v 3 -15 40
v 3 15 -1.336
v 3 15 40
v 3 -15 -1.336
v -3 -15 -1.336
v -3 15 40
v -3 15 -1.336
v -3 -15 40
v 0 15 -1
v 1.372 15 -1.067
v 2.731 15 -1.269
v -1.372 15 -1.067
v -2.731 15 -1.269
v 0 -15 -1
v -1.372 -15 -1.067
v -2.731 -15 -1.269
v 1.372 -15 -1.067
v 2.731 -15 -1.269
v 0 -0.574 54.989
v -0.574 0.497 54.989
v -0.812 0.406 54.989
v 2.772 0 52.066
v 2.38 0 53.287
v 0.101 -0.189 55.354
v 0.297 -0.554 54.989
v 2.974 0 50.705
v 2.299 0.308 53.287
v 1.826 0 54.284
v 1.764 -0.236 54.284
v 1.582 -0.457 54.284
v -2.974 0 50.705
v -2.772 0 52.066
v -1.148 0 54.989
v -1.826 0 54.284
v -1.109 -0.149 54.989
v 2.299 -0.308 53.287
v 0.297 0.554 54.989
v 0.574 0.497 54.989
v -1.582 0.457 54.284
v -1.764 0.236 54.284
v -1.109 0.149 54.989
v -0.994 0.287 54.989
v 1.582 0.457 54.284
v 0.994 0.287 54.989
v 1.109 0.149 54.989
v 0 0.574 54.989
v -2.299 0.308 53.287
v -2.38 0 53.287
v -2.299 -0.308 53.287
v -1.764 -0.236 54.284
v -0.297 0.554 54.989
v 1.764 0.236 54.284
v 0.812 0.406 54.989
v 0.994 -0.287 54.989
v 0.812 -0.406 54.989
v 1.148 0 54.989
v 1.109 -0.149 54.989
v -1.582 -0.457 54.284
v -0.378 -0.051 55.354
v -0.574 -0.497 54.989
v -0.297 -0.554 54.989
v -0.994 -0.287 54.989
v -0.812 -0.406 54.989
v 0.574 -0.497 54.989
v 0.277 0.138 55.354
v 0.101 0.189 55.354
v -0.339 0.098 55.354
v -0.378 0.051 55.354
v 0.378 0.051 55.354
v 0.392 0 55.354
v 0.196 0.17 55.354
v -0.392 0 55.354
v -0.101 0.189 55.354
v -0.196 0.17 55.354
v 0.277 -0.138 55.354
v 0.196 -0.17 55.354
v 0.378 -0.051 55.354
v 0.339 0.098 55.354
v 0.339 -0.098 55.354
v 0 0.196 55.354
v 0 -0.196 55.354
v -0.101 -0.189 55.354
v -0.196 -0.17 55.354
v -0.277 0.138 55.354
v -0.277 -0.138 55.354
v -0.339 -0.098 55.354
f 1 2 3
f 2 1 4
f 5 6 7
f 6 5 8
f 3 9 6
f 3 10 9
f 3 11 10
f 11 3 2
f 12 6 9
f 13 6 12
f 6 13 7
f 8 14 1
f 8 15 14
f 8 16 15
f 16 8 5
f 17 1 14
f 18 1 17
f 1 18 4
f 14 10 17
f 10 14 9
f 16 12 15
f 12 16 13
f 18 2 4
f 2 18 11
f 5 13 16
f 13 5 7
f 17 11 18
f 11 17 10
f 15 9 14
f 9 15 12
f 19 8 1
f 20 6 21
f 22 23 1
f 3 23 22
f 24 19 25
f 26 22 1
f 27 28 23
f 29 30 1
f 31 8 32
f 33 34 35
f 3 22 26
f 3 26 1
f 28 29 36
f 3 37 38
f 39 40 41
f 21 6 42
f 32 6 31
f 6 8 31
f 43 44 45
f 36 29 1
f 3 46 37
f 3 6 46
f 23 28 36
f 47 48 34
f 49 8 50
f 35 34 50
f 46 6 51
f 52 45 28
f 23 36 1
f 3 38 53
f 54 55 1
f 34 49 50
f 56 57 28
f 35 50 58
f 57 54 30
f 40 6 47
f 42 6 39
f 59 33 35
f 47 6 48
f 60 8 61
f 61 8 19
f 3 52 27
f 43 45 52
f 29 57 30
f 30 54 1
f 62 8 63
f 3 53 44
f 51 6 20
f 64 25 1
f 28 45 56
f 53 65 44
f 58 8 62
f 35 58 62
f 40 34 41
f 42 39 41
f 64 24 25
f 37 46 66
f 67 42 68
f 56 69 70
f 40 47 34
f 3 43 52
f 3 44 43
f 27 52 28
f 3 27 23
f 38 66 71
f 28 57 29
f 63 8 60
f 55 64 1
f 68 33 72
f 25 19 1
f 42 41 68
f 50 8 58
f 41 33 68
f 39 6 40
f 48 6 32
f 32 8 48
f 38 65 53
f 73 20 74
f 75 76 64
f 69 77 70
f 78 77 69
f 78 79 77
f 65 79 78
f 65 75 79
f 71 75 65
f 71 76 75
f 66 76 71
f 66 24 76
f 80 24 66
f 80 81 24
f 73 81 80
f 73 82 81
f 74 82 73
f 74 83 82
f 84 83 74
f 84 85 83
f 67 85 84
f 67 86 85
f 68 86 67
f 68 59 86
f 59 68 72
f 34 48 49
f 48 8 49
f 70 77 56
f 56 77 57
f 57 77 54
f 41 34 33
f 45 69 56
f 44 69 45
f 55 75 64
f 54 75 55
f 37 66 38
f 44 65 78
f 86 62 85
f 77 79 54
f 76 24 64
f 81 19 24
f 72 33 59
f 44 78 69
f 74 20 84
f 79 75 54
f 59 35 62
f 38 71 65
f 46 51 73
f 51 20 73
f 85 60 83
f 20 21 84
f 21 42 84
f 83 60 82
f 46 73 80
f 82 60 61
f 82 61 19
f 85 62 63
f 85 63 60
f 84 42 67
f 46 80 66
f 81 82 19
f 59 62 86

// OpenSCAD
// file: ../common.scad
/*
 * WAVE OCEAN V10 - TWISTED CAM SYSTEM
 * COMMON PARAMETERS
 *
 * Simplified mechanism: slats rest on cam surface, no follower arms
 * Single helical ridge creates traveling wave as cam rotates
 *
 * All dimensions in mm
 */

// ============================================
// PRINT TOLERANCES (tune for your printer)
// ============================================

TOL_CLEARANCE = 0.2;         // Shaft in hole clearance
TOL_PRESS_FIT = -0.15;       // Bearing press-fit interference
TOL_SLIDING = 0.3;           // Sliding fit (slats in guides)

// ============================================
// HARDWARE - BEARINGS
// ============================================

// 608 bearing (main shaft) - common, cheap
BEARING_608_ID = 8;
BEARING_608_OD = 22;
BEARING_608_H = 7;

// ============================================
// HARDWARE - FASTENERS
// ============================================

M3_HOLE = 3.2;
M3_HEAD_DIA = 5.5;
M3_HEAD_H = 3;
M4_HOLE = 4.2;

// ============================================
// MAIN SHAFT
// ============================================

SHAFT_DIA = 8;                   // 8mm steel rod
SHAFT_LENGTH = 260;              // Total shaft length
SHAFT_HOLE = SHAFT_DIA + TOL_CLEARANCE;  // 8.2mm

// ============================================
// TWISTED CAM DIMENSIONS
// ============================================

CAM_LENGTH = 200;                // Active wave zone
CAM_CORE_RADIUS = 12;            // Base cylinder radius
CAM_RIDGE_HEIGHT = 10;           // How much ridge sticks out
CAM_RIDGE_WIDTH = 8;             // Width of ridge (smoothness)
CAM_MAX_RADIUS = CAM_CORE_RADIUS + CAM_RIDGE_HEIGHT;  // 22mm

// Helix parameters
HELIX_TURNS = 2;                 // Number of complete spirals
HELIX_PITCH = CAM_LENGTH / HELIX_TURNS;  // 100mm per turn

// ============================================
// SLAT DIMENSIONS
// ============================================

NUM_SLATS = 24;
SLAT_SPACING = CAM_LENGTH / NUM_SLATS;  // 8.33mm

SLAT_WIDTH = 6;                  // X dimension (along cam axis)
SLAT_DEPTH = 30;                 // Y dimension (front to back)
SLAT_HEIGHT = 50;                // Z dimension (wave visual height)

// Slat bottom - curved to nest on cam surface
SLAT_CURVE_RADIUS = CAM_CORE_RADIUS + 2;  // Slightly larger than core

// Wave motion
WAVE_AMPLITUDE = CAM_RIDGE_HEIGHT;  // Total Z travel = ridge height

// ============================================
// GUIDE RAIL DIMENSIONS
// ============================================

// Minimal guides - thin vertical slots, barely visible
GUIDE_LENGTH = CAM_LENGTH + 20;  // 220mm
GUIDE_HEIGHT = WAVE_AMPLITUDE + SLAT_HEIGHT + 10;  // 70mm
GUIDE_THICKNESS = 3;             // Very thin - minimal visual impact
GUIDE_WALL = 2;

SLOT_WIDTH = SLAT_WIDTH + TOL_SLIDING;  // 6.3mm
SLOT_HEIGHT = WAVE_AMPLITUDE + 15;       // 25mm vertical travel

// ============================================
// BEARING BLOCK DIMENSIONS
// ============================================

BB_WIDTH = 30;
BB_DEPTH = 30;
BB_HEIGHT = CAM_MAX_RADIUS + 8;  // 30mm - cam clears base

BEARING_POCKET_DIA = BEARING_608_OD - TOL_PRESS_FIT;  // 22.15mm press fit
BEARING_POCKET_DEPTH = BEARING_608_H + 0.5;           // 7.5mm

// ============================================
// BASE PLATE DIMENSIONS
// ============================================

BASE_LENGTH = CAM_LENGTH + 60;   // 260mm
BASE_WIDTH = SLAT_DEPTH + 40;    // 70mm
BASE_THICKNESS = 5;

// ============================================
// ASSEMBLY POSITIONS
// ============================================

// Cam center Z (shaft axis height above base)
CAM_CENTER_Z = BASE_THICKNESS + BB_HEIGHT;  // 35mm

// Bearing blocks X positions
BB_LEFT_X = -CAM_LENGTH/2 - BB_WIDTH/2 - 5;   // -120mm
BB_RIGHT_X = CAM_LENGTH/2 + BB_WIDTH/2 + 5;   // +120mm

// Guide rails Y positions (front and back of slats)
GUIDE_FRONT_Y = -SLAT_DEPTH/2 - GUIDE_THICKNESS - 1;  // -17mm
GUIDE_BACK_Y = SLAT_DEPTH/2 + 1;                       // +16mm

// Guide rails Z position (bottom of guide)
GUIDE_Z = CAM_CENTER_Z + CAM_MAX_RADIUS - 5;  // 52mm

// ============================================
// COLORS
// ============================================

C_CAM = [0.7, 0.5, 0.25];        // Wood brown
C_SLAT = [0.15, 0.35, 0.6];      // Ocean blue
C_GUIDE = [0.3, 0.3, 0.35, 0.5]; // Dark gray, semi-transparent
C_BB = [0.35, 0.35, 0.4];        // Bearing block gray
C_BASE = [0.25, 0.25, 0.3];      // Dark base
C_SHAFT = [0.6, 0.6, 0.65];      // Steel

// ============================================
// HELPER FUNCTIONS
// ============================================

// Helix phase at position X along cam (0-360 per turn)
function helix_phase(x) = ((x + CAM_LENGTH/2) / CAM_LENGTH) * 360 * HELIX_TURNS;

// Cam surface height at position X, given cam rotation angle theta
// Returns how far the ridge sticks up at that X position
function ridge_height(x, theta) =
    let(phase = helix_phase(x) + theta)
    let(ridge = CAM_RIDGE_HEIGHT * max(0, cos(phase - 90)))
    ridge;

// Total cam radius at position X, angle theta
function cam_radius(x, theta) = CAM_CORE_RADIUS + ridge_height(x, theta);

// Slat X position (evenly spaced)
function slat_x(i) = i * SLAT_SPACING - CAM_LENGTH/2 + SLAT_SPACING/2;

// Slat Z position (bottom of slat rests on cam surface)
function slat_z(i, theta) =
    let(x = slat_x(i))
    CAM_CENTER_Z + cam_radius(x, theta);

// ============================================
// QUALITY
// ============================================

$fn = 48;

// ============================================
// VERIFICATION
// ============================================

echo("=== TWISTED CAM SYSTEM ===");
echo(str("Cam length: ", CAM_LENGTH, "mm"));
echo(str("Cam radius: ", CAM_CORE_RADIUS, "-", CAM_MAX_RADIUS, "mm"));
echo(str("Ridge height (wave amplitude): ", CAM_RIDGE_HEIGHT, "mm"));
echo(str("Helix turns: ", HELIX_TURNS));
echo(str("Slats: ", NUM_SLATS, " @ ", SLAT_SPACING, "mm spacing"));
echo(str("Slat gap: ", SLAT_SPACING - SLAT_WIDTH, "mm"));
// main file
/*
 * SLAT - Wave Piece with Cam Follower Bottom
 *
 * Printable part: 24x
 * Print orientation: Upright (Z up)
 *
 * Features:
 * - Wave crest profile at top (decorative)
 * - Curved bottom to ride on cam surface
 * - Smooth surface for quiet cam contact
 * - Rectangular body slides in guide slots
 */

include <../common.scad>

$fn = 48;

// ============================================
// MAIN SLAT MODULE
// ============================================

module slat() {
    union() {
        // Main body
        slat_body();

        // Wave crest top
        wave_crest();

        // Cam follower bottom
        cam_follower();
    }
}

// ============================================
// SLAT BODY
// ============================================

module slat_body() {
    // Rectangular body that slides in guide rail slots
    translate([-SLAT_WIDTH/2, -SLAT_DEPTH/2, 0])
        cube([SLAT_WIDTH, SLAT_DEPTH, SLAT_HEIGHT - 10]);
}

// ============================================
// WAVE CREST TOP
// ============================================

module wave_crest() {
    // Tapered, rounded top for wave visual
    hull() {
        // Top of main body
        translate([-SLAT_WIDTH/2, -SLAT_DEPTH/2, SLAT_HEIGHT - 12])
            cube([SLAT_WIDTH, SLAT_DEPTH, 2]);

        // Crest peak - rounded ellipse
        translate([0, 0, SLAT_HEIGHT])
        scale([1, 0.5, 1.8])
            sphere(d = SLAT_WIDTH, $fn = 24);
    }
}

// ============================================
// CAM FOLLOWER BOTTOM
// ============================================

module cam_follower() {
    // Curved bottom that rides on cam surface
    // Concave curve matches cam core radius + clearance

    follower_height = 8;
    curve_radius = SLAT_CURVE_RADIUS;

    translate([0, 0, -follower_height])
    difference() {
        // Solid base block
        translate([-SLAT_WIDTH/2, -SLAT_DEPTH/2, 0])
            cube([SLAT_WIDTH, SLAT_DEPTH, follower_height + 1]);

        // Concave curve (cut out)
        translate([0, 0, -curve_radius + follower_height - 1])
        rotate([90, 0, 0])
            cylinder(r = curve_radius, h = SLAT_DEPTH + 2, center = true, $fn = 64);
    }
}

// ============================================
// SLAT WITH WEAR PAD (Optional upgrade)
// ============================================

module slat_with_pad() {
    // Version with replaceable wear pad at bottom
    // For quieter operation or if using harder cam material

    difference() {
        slat();

        // Pocket for wear pad (felt or PTFE)
        translate([0, 0, -6])
        translate([-SLAT_WIDTH/2 + 1, -SLAT_DEPTH/2 + 2, 0])
            cube([SLAT_WIDTH - 2, SLAT_DEPTH - 4, 3]);
    }
}

// ============================================
// RENDER
// ============================================

color(C_SLAT)
slat();

// Show cam surface for reference
%translate([0, 0, -SLAT_CURVE_RADIUS - 5])
rotate([90, 0, 0])
    cylinder(r = CAM_CORE_RADIUS, h = SLAT_DEPTH + 10, center = true);

// ============================================
// INFO
// ============================================

echo("=== SLAT ===");
echo(str("Width: ", SLAT_WIDTH, "mm"));
echo(str("Depth: ", SLAT_DEPTH, "mm"));
echo(str("Height: ", SLAT_HEIGHT, "mm"));
echo(str("Follower curve radius: ", SLAT_CURVE_RADIUS, "mm"));
echo("");
echo("Print: 24x");
echo("Orientation: Upright (Z up)");
echo("Material: PLA (or PETG for durability)");
echo("Tip: Sand bottom curve smooth for quiet operation");
